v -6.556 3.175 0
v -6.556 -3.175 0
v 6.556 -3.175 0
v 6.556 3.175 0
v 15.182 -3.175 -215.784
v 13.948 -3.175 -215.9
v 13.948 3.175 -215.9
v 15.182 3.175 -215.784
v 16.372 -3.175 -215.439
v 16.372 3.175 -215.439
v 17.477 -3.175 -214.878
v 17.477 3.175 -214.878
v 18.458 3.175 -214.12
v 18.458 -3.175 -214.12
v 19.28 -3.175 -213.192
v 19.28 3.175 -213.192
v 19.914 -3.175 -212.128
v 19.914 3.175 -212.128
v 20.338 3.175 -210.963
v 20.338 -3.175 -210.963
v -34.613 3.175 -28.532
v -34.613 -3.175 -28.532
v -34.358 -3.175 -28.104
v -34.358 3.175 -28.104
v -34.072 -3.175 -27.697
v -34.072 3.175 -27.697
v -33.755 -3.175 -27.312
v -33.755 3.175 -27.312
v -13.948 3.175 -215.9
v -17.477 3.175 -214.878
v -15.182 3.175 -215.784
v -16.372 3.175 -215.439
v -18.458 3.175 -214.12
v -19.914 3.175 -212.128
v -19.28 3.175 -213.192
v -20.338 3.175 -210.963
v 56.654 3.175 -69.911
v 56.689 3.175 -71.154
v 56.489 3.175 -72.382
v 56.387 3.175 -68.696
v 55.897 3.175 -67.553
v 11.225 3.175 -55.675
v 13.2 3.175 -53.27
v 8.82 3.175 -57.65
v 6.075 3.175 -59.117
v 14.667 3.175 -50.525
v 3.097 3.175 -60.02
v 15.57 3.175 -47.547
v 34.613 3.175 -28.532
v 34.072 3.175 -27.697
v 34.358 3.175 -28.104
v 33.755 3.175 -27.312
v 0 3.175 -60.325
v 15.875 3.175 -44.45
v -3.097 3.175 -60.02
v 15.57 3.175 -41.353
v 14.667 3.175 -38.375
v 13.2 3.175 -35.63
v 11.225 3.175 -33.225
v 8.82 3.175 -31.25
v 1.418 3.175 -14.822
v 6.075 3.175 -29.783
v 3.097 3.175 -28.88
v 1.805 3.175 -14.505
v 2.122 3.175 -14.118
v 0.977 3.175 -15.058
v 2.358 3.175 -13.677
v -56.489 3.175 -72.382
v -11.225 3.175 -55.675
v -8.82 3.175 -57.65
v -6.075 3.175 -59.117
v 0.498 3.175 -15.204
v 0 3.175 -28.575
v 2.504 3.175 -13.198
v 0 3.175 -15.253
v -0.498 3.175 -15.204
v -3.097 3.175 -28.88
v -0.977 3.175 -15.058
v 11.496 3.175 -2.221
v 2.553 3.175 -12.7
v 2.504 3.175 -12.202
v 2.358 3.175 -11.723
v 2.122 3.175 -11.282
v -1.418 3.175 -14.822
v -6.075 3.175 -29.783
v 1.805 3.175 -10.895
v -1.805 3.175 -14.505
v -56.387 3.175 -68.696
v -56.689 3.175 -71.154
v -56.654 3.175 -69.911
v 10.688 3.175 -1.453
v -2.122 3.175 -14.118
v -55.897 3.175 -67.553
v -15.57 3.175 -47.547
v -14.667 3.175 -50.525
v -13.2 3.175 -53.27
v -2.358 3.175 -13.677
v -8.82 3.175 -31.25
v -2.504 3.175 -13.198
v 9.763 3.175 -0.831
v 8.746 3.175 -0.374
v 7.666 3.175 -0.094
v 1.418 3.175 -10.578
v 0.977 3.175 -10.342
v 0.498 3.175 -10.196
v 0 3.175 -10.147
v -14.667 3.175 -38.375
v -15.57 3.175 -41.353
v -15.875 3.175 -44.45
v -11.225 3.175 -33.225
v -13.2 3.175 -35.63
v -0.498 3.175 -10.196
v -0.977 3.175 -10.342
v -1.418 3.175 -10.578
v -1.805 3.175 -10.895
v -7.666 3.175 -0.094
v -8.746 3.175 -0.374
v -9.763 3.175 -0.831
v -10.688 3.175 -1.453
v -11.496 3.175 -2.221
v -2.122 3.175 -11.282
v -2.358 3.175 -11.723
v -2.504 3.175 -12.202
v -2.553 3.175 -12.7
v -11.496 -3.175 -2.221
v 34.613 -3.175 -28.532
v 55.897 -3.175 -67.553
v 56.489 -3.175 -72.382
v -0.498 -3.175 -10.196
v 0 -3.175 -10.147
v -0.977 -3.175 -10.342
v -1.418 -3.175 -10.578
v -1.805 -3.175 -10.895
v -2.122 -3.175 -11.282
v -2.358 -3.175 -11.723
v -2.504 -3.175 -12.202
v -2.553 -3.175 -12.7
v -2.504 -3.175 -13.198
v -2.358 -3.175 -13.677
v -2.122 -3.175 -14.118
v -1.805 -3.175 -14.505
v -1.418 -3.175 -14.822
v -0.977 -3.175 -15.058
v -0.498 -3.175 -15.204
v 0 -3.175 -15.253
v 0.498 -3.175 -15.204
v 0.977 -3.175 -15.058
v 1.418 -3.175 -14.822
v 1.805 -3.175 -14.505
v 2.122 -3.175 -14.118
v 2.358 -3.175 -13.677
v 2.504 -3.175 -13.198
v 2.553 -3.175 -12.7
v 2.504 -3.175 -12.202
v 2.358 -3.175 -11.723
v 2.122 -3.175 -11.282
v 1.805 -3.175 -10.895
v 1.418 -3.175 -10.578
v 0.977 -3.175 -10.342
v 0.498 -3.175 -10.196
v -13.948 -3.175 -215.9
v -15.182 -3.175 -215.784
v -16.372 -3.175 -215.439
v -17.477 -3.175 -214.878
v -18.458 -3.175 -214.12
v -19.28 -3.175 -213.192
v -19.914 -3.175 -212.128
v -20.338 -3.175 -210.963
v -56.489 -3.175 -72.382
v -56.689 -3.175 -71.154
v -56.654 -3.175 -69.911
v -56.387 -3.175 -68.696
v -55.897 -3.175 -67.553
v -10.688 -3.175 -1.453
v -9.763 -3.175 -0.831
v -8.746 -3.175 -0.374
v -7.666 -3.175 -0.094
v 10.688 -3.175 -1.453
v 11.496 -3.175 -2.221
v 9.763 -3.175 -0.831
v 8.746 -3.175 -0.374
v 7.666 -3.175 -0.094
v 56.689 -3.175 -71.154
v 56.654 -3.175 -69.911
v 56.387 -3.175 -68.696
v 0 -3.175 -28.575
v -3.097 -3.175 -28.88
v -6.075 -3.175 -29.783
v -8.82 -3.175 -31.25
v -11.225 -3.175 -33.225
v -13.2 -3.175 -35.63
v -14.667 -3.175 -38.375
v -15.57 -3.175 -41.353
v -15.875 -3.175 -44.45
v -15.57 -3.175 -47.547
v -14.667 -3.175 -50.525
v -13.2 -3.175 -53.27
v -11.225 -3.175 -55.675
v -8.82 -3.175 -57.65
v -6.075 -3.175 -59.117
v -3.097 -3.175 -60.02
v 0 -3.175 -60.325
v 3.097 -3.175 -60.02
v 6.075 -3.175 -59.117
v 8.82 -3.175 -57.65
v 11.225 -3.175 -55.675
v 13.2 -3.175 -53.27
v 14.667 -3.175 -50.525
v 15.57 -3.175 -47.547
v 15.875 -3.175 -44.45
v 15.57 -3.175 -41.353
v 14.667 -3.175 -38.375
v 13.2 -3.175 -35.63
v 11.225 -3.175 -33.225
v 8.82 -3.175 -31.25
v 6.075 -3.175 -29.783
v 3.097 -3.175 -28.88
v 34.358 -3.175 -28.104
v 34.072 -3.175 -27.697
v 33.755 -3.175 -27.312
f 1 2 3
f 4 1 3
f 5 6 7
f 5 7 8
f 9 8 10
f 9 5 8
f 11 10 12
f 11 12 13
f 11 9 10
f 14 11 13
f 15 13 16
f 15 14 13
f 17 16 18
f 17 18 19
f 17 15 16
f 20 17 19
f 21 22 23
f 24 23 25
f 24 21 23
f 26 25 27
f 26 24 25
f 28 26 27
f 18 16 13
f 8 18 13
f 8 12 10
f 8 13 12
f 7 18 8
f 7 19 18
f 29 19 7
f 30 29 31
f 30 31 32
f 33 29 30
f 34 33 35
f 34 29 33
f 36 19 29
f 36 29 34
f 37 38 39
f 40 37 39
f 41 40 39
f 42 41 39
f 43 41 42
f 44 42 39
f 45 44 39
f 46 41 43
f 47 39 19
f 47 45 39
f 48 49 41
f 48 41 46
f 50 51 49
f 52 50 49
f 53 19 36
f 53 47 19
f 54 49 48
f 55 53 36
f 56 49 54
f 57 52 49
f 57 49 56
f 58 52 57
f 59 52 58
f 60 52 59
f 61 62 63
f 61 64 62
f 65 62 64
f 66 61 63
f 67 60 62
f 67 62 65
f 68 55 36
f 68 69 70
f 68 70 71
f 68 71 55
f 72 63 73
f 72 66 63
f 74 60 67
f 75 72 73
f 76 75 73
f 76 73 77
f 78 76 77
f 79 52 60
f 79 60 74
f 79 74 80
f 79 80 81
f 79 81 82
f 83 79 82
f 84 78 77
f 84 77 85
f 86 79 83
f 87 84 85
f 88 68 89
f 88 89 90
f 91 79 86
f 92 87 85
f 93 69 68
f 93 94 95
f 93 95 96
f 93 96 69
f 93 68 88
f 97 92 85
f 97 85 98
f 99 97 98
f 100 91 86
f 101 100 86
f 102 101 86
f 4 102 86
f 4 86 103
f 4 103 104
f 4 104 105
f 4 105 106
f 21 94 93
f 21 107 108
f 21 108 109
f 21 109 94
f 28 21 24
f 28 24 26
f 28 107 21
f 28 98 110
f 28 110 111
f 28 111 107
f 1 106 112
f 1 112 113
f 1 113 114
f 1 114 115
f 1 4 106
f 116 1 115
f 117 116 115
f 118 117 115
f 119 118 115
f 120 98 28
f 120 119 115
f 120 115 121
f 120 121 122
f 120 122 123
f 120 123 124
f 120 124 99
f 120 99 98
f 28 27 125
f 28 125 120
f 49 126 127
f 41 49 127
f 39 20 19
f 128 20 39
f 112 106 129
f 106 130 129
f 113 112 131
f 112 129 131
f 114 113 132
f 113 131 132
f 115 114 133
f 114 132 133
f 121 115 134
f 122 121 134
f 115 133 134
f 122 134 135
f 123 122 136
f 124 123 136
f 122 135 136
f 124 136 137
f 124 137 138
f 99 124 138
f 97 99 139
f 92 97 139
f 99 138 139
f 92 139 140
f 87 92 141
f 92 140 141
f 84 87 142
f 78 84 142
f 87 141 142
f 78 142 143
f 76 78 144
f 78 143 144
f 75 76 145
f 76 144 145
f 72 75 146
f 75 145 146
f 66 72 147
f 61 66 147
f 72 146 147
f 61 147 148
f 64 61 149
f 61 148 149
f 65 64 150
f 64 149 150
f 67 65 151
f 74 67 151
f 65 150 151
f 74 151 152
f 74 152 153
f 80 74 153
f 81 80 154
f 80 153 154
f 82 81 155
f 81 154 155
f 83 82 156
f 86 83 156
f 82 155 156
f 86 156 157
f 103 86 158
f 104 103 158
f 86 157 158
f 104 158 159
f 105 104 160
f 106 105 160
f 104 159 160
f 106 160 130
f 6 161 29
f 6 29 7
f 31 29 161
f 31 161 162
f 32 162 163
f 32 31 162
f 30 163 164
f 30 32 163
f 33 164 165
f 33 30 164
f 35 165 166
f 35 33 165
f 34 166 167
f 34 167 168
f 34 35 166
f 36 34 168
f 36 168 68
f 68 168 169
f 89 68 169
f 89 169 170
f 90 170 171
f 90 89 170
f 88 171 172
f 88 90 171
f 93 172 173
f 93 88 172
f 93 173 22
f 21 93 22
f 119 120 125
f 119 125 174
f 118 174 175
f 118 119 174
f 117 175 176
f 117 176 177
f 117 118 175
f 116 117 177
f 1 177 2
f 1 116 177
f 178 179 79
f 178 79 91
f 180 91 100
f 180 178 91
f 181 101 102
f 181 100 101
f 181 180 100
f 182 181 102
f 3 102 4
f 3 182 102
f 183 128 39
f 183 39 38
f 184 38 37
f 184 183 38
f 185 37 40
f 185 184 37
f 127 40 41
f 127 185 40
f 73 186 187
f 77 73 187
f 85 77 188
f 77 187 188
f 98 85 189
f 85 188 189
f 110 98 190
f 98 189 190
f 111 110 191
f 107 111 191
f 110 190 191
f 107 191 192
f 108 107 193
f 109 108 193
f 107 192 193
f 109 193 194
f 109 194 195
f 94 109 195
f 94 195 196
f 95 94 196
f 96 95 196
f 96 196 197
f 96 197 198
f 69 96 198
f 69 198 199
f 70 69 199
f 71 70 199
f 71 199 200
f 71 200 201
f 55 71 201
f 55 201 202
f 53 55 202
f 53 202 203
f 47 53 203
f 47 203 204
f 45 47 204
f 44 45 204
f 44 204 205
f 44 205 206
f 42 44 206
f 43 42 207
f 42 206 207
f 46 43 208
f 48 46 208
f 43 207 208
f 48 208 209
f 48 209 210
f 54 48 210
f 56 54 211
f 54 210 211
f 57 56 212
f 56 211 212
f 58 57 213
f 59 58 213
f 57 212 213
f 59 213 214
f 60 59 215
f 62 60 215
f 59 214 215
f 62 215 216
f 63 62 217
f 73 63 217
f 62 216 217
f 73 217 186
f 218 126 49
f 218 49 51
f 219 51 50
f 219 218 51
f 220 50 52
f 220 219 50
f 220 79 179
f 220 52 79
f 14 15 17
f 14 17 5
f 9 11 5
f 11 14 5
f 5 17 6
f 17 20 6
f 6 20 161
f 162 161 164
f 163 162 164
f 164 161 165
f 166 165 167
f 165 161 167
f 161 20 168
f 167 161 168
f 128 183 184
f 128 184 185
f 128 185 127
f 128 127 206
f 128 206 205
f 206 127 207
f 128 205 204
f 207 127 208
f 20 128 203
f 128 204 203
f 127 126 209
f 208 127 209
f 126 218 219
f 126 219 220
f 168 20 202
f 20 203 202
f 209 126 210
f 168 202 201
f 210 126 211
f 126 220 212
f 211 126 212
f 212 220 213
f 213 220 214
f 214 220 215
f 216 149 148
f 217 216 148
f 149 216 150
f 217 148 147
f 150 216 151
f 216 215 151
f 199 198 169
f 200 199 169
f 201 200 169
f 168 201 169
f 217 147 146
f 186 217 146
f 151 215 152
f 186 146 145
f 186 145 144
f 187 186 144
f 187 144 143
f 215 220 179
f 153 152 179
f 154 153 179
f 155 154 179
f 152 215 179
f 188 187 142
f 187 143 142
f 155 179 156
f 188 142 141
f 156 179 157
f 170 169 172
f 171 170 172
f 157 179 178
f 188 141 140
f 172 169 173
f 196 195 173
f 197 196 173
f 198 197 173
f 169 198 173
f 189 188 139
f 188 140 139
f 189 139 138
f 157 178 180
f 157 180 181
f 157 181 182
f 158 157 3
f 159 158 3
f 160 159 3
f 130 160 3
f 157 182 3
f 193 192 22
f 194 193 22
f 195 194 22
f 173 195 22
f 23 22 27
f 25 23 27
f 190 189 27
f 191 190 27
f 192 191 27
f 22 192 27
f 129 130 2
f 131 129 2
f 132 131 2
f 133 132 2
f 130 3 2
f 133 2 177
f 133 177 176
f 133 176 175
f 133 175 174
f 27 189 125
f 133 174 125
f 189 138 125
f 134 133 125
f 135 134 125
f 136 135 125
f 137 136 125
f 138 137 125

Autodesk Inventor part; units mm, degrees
ref_plane "YZ Plane" through (0, 0, 0) normal (1, 0, 0) x (0, 1, 0)
ref_plane "XZ Plane" through (0, 0, 0) normal (0, 1, 0) x (-1, 0, 0)
ref_plane "XY Plane" through (0, 0, 0) normal (0, 0, 1) x (1, 0, 0)
sketch "Sketch1" plane through (0, 0, 0) normal (0, 1, 0) x (-1, 0, 0)
  line L0 (19.05, -215.9) -> (-19.05, -215.9)
  line L1 (-19.05, -215.9) -> (-57.15, -69.85)
  line L2 (19.05, -215.9) -> (57.15, -69.85)
  line L3 (57.15, -69.85) -> (19.05, 0)
  line L4 (19.05, 0) -> (-19.05, 0)
  line L5 (-19.05, 0) -> (-57.15, -69.85)
  line L6 (57.15, -69.85) -> (-57.15, -69.85) construction
  line L7 (-12.7, -50.8) -> (12.7, -50.8) construction
  line L8 (12.7, -50.8) -> (12.7, 0) construction
  line L9 (12.7, 0) -> (-12.7, 0) construction
  line L10 (-12.7, 0) -> (-12.7, -50.8) construction
  point P0 (0, 0)
  point P1 (0, -215.9)
  point P2 (0, -69.85)
  point P3 (0, 0)
  dimension "d0" = 25.4
  dimension "d1" = 50.8
  dimension "d2" = 6.35
  dimension "d3" = 114.3
  dimension "d4" = 215.9
  dimension "d5" = 19.05
  dimension "d6" = 38.1
extrude "Extrusion1" add sketch "Sketch1" along normal mid plane 6.35
fillet "Fillet1" radius 6.604 4 edges at (57.15, 0, -69.85) (19.05, 0, -215.9) (-19.05, 0, -215.9) (-57.15, 0, -69.85)
fillet "Fillet2" [suppressed]
sketch "Sketch2" plane through (0, 3.175, 0) normal (0, 1, 0) x (1, 0, 0)
  arc A0 (20.3379, 210.963) -> (13.9478, 215.9) centre (13.9478, 209.296) ccw construction
  line L0 (20.3379, 210.963) -> (56.4895, 72.3821) construction
  arc A1 (55.8969, 67.5527) -> (56.4895, 72.3821) centre (50.0993, 70.7151) ccw construction
  line L1 (55.8969, 67.5527) -> (19.05, 0) construction
  line L2 (-19.05, 0) -> (-55.8969, 67.5527) construction
  arc A2 (-56.4895, 72.3821) -> (-55.8969, 67.5527) centre (-50.0993, 70.7151) ccw construction
  line L3 (-56.4895, 72.3821) -> (-20.3379, 210.963) construction
  arc A3 (-13.9478, 215.9) -> (-20.3379, 210.963) centre (-13.9478, 209.296) ccw construction
  line L4 (-13.9478, 215.9) -> (13.9478, 215.9) construction
  line L5 (13.9478, 215.9) -> (-13.9478, 215.9) construction
  line L6 (19.05, 0) -> (-19.05, 0) projected
  point P0 (0, 44.45)
  point P1 (0, 215.9)
  point P2 (0, 215.9)
hole "Hole1" at (0, 3.175, -44.45) direction (0, -1, 0) diameter 31.75 end through all
chamfer "Chamfer1" distance 9.525 distance2 31.75 2 edges at (19.05, 0, 0) (-19.05, 0, 0) measured on face at (6.35, 1.0583, 0)
fillet "Fillet3" radius 6.604 4 edges at (9.525, 0, 0) (34.2536, 0, -27.8732) (-9.525, 0, 0) (-34.2536, 0, -27.8732)
sketch "Sketch3" plane through (0, 3.175, 0) normal (0, 1, 0) x (1, 0, 0)
  circle A0 centre (0, 44.45) radius 15.875 construction
  arc A1 (20.3379, 210.963) -> (13.9478, 215.9) centre (13.9478, 209.296) ccw construction
  line L0 (20.3379, 210.963) -> (56.4895, 72.3821) construction
  arc A2 (55.8969, 67.5527) -> (56.4895, 72.3821) centre (50.0993, 70.7151) ccw construction
  line L1 (55.8969, 67.5527) -> (34.613, 28.5321) construction
  arc A3 (33.7554, 27.3117) -> (34.613, 28.5321) centre (28.8154, 31.6945) ccw construction
  line L2 (33.7554, 27.3117) -> (11.4957, 2.2213) construction
  arc A4 (6.5556, 0) -> (11.4957, 2.2213) centre (6.5556, 6.604) ccw construction
  line L3 (6.5556, 0) -> (-6.5556, 0) construction
  arc A5 (-11.4957, 2.2213) -> (-6.5556, 0) centre (-6.5556, 6.604) ccw construction
  line L4 (-11.4957, 2.2213) -> (-33.7554, 27.3117) construction
  arc A6 (-34.613, 28.5321) -> (-33.7554, 27.3117) centre (-28.8154, 31.6945) ccw construction
  line L5 (-34.613, 28.5321) -> (-55.8969, 67.5527) construction
  arc A7 (-56.4895, 72.3821) -> (-55.8969, 67.5527) centre (-50.0993, 70.7151) ccw construction
  line L6 (-56.4895, 72.3821) -> (-20.3379, 210.963) construction
  arc A8 (-13.9478, 215.9) -> (-20.3379, 210.963) centre (-13.9478, 209.296) ccw construction
  line L7 (-13.9478, 215.9) -> (13.9478, 215.9) construction
  point P0 (0, 0)
  point P1 (0, 12.7)
  dimension "d24" = 31.75
hole "Hole2" at (0, 3.175, -12.7) direction (0, -1, 0) diameter 5.1054 end through all clearance for "Flat Head Machine Screw (82)" size "#10" standard "Ansi Unified Screw Threads"
equation "\"d23\" = d9"
equation "\"d9\" = 6.604"
properties part number "CL4-003" material "Aluminum 6061"
